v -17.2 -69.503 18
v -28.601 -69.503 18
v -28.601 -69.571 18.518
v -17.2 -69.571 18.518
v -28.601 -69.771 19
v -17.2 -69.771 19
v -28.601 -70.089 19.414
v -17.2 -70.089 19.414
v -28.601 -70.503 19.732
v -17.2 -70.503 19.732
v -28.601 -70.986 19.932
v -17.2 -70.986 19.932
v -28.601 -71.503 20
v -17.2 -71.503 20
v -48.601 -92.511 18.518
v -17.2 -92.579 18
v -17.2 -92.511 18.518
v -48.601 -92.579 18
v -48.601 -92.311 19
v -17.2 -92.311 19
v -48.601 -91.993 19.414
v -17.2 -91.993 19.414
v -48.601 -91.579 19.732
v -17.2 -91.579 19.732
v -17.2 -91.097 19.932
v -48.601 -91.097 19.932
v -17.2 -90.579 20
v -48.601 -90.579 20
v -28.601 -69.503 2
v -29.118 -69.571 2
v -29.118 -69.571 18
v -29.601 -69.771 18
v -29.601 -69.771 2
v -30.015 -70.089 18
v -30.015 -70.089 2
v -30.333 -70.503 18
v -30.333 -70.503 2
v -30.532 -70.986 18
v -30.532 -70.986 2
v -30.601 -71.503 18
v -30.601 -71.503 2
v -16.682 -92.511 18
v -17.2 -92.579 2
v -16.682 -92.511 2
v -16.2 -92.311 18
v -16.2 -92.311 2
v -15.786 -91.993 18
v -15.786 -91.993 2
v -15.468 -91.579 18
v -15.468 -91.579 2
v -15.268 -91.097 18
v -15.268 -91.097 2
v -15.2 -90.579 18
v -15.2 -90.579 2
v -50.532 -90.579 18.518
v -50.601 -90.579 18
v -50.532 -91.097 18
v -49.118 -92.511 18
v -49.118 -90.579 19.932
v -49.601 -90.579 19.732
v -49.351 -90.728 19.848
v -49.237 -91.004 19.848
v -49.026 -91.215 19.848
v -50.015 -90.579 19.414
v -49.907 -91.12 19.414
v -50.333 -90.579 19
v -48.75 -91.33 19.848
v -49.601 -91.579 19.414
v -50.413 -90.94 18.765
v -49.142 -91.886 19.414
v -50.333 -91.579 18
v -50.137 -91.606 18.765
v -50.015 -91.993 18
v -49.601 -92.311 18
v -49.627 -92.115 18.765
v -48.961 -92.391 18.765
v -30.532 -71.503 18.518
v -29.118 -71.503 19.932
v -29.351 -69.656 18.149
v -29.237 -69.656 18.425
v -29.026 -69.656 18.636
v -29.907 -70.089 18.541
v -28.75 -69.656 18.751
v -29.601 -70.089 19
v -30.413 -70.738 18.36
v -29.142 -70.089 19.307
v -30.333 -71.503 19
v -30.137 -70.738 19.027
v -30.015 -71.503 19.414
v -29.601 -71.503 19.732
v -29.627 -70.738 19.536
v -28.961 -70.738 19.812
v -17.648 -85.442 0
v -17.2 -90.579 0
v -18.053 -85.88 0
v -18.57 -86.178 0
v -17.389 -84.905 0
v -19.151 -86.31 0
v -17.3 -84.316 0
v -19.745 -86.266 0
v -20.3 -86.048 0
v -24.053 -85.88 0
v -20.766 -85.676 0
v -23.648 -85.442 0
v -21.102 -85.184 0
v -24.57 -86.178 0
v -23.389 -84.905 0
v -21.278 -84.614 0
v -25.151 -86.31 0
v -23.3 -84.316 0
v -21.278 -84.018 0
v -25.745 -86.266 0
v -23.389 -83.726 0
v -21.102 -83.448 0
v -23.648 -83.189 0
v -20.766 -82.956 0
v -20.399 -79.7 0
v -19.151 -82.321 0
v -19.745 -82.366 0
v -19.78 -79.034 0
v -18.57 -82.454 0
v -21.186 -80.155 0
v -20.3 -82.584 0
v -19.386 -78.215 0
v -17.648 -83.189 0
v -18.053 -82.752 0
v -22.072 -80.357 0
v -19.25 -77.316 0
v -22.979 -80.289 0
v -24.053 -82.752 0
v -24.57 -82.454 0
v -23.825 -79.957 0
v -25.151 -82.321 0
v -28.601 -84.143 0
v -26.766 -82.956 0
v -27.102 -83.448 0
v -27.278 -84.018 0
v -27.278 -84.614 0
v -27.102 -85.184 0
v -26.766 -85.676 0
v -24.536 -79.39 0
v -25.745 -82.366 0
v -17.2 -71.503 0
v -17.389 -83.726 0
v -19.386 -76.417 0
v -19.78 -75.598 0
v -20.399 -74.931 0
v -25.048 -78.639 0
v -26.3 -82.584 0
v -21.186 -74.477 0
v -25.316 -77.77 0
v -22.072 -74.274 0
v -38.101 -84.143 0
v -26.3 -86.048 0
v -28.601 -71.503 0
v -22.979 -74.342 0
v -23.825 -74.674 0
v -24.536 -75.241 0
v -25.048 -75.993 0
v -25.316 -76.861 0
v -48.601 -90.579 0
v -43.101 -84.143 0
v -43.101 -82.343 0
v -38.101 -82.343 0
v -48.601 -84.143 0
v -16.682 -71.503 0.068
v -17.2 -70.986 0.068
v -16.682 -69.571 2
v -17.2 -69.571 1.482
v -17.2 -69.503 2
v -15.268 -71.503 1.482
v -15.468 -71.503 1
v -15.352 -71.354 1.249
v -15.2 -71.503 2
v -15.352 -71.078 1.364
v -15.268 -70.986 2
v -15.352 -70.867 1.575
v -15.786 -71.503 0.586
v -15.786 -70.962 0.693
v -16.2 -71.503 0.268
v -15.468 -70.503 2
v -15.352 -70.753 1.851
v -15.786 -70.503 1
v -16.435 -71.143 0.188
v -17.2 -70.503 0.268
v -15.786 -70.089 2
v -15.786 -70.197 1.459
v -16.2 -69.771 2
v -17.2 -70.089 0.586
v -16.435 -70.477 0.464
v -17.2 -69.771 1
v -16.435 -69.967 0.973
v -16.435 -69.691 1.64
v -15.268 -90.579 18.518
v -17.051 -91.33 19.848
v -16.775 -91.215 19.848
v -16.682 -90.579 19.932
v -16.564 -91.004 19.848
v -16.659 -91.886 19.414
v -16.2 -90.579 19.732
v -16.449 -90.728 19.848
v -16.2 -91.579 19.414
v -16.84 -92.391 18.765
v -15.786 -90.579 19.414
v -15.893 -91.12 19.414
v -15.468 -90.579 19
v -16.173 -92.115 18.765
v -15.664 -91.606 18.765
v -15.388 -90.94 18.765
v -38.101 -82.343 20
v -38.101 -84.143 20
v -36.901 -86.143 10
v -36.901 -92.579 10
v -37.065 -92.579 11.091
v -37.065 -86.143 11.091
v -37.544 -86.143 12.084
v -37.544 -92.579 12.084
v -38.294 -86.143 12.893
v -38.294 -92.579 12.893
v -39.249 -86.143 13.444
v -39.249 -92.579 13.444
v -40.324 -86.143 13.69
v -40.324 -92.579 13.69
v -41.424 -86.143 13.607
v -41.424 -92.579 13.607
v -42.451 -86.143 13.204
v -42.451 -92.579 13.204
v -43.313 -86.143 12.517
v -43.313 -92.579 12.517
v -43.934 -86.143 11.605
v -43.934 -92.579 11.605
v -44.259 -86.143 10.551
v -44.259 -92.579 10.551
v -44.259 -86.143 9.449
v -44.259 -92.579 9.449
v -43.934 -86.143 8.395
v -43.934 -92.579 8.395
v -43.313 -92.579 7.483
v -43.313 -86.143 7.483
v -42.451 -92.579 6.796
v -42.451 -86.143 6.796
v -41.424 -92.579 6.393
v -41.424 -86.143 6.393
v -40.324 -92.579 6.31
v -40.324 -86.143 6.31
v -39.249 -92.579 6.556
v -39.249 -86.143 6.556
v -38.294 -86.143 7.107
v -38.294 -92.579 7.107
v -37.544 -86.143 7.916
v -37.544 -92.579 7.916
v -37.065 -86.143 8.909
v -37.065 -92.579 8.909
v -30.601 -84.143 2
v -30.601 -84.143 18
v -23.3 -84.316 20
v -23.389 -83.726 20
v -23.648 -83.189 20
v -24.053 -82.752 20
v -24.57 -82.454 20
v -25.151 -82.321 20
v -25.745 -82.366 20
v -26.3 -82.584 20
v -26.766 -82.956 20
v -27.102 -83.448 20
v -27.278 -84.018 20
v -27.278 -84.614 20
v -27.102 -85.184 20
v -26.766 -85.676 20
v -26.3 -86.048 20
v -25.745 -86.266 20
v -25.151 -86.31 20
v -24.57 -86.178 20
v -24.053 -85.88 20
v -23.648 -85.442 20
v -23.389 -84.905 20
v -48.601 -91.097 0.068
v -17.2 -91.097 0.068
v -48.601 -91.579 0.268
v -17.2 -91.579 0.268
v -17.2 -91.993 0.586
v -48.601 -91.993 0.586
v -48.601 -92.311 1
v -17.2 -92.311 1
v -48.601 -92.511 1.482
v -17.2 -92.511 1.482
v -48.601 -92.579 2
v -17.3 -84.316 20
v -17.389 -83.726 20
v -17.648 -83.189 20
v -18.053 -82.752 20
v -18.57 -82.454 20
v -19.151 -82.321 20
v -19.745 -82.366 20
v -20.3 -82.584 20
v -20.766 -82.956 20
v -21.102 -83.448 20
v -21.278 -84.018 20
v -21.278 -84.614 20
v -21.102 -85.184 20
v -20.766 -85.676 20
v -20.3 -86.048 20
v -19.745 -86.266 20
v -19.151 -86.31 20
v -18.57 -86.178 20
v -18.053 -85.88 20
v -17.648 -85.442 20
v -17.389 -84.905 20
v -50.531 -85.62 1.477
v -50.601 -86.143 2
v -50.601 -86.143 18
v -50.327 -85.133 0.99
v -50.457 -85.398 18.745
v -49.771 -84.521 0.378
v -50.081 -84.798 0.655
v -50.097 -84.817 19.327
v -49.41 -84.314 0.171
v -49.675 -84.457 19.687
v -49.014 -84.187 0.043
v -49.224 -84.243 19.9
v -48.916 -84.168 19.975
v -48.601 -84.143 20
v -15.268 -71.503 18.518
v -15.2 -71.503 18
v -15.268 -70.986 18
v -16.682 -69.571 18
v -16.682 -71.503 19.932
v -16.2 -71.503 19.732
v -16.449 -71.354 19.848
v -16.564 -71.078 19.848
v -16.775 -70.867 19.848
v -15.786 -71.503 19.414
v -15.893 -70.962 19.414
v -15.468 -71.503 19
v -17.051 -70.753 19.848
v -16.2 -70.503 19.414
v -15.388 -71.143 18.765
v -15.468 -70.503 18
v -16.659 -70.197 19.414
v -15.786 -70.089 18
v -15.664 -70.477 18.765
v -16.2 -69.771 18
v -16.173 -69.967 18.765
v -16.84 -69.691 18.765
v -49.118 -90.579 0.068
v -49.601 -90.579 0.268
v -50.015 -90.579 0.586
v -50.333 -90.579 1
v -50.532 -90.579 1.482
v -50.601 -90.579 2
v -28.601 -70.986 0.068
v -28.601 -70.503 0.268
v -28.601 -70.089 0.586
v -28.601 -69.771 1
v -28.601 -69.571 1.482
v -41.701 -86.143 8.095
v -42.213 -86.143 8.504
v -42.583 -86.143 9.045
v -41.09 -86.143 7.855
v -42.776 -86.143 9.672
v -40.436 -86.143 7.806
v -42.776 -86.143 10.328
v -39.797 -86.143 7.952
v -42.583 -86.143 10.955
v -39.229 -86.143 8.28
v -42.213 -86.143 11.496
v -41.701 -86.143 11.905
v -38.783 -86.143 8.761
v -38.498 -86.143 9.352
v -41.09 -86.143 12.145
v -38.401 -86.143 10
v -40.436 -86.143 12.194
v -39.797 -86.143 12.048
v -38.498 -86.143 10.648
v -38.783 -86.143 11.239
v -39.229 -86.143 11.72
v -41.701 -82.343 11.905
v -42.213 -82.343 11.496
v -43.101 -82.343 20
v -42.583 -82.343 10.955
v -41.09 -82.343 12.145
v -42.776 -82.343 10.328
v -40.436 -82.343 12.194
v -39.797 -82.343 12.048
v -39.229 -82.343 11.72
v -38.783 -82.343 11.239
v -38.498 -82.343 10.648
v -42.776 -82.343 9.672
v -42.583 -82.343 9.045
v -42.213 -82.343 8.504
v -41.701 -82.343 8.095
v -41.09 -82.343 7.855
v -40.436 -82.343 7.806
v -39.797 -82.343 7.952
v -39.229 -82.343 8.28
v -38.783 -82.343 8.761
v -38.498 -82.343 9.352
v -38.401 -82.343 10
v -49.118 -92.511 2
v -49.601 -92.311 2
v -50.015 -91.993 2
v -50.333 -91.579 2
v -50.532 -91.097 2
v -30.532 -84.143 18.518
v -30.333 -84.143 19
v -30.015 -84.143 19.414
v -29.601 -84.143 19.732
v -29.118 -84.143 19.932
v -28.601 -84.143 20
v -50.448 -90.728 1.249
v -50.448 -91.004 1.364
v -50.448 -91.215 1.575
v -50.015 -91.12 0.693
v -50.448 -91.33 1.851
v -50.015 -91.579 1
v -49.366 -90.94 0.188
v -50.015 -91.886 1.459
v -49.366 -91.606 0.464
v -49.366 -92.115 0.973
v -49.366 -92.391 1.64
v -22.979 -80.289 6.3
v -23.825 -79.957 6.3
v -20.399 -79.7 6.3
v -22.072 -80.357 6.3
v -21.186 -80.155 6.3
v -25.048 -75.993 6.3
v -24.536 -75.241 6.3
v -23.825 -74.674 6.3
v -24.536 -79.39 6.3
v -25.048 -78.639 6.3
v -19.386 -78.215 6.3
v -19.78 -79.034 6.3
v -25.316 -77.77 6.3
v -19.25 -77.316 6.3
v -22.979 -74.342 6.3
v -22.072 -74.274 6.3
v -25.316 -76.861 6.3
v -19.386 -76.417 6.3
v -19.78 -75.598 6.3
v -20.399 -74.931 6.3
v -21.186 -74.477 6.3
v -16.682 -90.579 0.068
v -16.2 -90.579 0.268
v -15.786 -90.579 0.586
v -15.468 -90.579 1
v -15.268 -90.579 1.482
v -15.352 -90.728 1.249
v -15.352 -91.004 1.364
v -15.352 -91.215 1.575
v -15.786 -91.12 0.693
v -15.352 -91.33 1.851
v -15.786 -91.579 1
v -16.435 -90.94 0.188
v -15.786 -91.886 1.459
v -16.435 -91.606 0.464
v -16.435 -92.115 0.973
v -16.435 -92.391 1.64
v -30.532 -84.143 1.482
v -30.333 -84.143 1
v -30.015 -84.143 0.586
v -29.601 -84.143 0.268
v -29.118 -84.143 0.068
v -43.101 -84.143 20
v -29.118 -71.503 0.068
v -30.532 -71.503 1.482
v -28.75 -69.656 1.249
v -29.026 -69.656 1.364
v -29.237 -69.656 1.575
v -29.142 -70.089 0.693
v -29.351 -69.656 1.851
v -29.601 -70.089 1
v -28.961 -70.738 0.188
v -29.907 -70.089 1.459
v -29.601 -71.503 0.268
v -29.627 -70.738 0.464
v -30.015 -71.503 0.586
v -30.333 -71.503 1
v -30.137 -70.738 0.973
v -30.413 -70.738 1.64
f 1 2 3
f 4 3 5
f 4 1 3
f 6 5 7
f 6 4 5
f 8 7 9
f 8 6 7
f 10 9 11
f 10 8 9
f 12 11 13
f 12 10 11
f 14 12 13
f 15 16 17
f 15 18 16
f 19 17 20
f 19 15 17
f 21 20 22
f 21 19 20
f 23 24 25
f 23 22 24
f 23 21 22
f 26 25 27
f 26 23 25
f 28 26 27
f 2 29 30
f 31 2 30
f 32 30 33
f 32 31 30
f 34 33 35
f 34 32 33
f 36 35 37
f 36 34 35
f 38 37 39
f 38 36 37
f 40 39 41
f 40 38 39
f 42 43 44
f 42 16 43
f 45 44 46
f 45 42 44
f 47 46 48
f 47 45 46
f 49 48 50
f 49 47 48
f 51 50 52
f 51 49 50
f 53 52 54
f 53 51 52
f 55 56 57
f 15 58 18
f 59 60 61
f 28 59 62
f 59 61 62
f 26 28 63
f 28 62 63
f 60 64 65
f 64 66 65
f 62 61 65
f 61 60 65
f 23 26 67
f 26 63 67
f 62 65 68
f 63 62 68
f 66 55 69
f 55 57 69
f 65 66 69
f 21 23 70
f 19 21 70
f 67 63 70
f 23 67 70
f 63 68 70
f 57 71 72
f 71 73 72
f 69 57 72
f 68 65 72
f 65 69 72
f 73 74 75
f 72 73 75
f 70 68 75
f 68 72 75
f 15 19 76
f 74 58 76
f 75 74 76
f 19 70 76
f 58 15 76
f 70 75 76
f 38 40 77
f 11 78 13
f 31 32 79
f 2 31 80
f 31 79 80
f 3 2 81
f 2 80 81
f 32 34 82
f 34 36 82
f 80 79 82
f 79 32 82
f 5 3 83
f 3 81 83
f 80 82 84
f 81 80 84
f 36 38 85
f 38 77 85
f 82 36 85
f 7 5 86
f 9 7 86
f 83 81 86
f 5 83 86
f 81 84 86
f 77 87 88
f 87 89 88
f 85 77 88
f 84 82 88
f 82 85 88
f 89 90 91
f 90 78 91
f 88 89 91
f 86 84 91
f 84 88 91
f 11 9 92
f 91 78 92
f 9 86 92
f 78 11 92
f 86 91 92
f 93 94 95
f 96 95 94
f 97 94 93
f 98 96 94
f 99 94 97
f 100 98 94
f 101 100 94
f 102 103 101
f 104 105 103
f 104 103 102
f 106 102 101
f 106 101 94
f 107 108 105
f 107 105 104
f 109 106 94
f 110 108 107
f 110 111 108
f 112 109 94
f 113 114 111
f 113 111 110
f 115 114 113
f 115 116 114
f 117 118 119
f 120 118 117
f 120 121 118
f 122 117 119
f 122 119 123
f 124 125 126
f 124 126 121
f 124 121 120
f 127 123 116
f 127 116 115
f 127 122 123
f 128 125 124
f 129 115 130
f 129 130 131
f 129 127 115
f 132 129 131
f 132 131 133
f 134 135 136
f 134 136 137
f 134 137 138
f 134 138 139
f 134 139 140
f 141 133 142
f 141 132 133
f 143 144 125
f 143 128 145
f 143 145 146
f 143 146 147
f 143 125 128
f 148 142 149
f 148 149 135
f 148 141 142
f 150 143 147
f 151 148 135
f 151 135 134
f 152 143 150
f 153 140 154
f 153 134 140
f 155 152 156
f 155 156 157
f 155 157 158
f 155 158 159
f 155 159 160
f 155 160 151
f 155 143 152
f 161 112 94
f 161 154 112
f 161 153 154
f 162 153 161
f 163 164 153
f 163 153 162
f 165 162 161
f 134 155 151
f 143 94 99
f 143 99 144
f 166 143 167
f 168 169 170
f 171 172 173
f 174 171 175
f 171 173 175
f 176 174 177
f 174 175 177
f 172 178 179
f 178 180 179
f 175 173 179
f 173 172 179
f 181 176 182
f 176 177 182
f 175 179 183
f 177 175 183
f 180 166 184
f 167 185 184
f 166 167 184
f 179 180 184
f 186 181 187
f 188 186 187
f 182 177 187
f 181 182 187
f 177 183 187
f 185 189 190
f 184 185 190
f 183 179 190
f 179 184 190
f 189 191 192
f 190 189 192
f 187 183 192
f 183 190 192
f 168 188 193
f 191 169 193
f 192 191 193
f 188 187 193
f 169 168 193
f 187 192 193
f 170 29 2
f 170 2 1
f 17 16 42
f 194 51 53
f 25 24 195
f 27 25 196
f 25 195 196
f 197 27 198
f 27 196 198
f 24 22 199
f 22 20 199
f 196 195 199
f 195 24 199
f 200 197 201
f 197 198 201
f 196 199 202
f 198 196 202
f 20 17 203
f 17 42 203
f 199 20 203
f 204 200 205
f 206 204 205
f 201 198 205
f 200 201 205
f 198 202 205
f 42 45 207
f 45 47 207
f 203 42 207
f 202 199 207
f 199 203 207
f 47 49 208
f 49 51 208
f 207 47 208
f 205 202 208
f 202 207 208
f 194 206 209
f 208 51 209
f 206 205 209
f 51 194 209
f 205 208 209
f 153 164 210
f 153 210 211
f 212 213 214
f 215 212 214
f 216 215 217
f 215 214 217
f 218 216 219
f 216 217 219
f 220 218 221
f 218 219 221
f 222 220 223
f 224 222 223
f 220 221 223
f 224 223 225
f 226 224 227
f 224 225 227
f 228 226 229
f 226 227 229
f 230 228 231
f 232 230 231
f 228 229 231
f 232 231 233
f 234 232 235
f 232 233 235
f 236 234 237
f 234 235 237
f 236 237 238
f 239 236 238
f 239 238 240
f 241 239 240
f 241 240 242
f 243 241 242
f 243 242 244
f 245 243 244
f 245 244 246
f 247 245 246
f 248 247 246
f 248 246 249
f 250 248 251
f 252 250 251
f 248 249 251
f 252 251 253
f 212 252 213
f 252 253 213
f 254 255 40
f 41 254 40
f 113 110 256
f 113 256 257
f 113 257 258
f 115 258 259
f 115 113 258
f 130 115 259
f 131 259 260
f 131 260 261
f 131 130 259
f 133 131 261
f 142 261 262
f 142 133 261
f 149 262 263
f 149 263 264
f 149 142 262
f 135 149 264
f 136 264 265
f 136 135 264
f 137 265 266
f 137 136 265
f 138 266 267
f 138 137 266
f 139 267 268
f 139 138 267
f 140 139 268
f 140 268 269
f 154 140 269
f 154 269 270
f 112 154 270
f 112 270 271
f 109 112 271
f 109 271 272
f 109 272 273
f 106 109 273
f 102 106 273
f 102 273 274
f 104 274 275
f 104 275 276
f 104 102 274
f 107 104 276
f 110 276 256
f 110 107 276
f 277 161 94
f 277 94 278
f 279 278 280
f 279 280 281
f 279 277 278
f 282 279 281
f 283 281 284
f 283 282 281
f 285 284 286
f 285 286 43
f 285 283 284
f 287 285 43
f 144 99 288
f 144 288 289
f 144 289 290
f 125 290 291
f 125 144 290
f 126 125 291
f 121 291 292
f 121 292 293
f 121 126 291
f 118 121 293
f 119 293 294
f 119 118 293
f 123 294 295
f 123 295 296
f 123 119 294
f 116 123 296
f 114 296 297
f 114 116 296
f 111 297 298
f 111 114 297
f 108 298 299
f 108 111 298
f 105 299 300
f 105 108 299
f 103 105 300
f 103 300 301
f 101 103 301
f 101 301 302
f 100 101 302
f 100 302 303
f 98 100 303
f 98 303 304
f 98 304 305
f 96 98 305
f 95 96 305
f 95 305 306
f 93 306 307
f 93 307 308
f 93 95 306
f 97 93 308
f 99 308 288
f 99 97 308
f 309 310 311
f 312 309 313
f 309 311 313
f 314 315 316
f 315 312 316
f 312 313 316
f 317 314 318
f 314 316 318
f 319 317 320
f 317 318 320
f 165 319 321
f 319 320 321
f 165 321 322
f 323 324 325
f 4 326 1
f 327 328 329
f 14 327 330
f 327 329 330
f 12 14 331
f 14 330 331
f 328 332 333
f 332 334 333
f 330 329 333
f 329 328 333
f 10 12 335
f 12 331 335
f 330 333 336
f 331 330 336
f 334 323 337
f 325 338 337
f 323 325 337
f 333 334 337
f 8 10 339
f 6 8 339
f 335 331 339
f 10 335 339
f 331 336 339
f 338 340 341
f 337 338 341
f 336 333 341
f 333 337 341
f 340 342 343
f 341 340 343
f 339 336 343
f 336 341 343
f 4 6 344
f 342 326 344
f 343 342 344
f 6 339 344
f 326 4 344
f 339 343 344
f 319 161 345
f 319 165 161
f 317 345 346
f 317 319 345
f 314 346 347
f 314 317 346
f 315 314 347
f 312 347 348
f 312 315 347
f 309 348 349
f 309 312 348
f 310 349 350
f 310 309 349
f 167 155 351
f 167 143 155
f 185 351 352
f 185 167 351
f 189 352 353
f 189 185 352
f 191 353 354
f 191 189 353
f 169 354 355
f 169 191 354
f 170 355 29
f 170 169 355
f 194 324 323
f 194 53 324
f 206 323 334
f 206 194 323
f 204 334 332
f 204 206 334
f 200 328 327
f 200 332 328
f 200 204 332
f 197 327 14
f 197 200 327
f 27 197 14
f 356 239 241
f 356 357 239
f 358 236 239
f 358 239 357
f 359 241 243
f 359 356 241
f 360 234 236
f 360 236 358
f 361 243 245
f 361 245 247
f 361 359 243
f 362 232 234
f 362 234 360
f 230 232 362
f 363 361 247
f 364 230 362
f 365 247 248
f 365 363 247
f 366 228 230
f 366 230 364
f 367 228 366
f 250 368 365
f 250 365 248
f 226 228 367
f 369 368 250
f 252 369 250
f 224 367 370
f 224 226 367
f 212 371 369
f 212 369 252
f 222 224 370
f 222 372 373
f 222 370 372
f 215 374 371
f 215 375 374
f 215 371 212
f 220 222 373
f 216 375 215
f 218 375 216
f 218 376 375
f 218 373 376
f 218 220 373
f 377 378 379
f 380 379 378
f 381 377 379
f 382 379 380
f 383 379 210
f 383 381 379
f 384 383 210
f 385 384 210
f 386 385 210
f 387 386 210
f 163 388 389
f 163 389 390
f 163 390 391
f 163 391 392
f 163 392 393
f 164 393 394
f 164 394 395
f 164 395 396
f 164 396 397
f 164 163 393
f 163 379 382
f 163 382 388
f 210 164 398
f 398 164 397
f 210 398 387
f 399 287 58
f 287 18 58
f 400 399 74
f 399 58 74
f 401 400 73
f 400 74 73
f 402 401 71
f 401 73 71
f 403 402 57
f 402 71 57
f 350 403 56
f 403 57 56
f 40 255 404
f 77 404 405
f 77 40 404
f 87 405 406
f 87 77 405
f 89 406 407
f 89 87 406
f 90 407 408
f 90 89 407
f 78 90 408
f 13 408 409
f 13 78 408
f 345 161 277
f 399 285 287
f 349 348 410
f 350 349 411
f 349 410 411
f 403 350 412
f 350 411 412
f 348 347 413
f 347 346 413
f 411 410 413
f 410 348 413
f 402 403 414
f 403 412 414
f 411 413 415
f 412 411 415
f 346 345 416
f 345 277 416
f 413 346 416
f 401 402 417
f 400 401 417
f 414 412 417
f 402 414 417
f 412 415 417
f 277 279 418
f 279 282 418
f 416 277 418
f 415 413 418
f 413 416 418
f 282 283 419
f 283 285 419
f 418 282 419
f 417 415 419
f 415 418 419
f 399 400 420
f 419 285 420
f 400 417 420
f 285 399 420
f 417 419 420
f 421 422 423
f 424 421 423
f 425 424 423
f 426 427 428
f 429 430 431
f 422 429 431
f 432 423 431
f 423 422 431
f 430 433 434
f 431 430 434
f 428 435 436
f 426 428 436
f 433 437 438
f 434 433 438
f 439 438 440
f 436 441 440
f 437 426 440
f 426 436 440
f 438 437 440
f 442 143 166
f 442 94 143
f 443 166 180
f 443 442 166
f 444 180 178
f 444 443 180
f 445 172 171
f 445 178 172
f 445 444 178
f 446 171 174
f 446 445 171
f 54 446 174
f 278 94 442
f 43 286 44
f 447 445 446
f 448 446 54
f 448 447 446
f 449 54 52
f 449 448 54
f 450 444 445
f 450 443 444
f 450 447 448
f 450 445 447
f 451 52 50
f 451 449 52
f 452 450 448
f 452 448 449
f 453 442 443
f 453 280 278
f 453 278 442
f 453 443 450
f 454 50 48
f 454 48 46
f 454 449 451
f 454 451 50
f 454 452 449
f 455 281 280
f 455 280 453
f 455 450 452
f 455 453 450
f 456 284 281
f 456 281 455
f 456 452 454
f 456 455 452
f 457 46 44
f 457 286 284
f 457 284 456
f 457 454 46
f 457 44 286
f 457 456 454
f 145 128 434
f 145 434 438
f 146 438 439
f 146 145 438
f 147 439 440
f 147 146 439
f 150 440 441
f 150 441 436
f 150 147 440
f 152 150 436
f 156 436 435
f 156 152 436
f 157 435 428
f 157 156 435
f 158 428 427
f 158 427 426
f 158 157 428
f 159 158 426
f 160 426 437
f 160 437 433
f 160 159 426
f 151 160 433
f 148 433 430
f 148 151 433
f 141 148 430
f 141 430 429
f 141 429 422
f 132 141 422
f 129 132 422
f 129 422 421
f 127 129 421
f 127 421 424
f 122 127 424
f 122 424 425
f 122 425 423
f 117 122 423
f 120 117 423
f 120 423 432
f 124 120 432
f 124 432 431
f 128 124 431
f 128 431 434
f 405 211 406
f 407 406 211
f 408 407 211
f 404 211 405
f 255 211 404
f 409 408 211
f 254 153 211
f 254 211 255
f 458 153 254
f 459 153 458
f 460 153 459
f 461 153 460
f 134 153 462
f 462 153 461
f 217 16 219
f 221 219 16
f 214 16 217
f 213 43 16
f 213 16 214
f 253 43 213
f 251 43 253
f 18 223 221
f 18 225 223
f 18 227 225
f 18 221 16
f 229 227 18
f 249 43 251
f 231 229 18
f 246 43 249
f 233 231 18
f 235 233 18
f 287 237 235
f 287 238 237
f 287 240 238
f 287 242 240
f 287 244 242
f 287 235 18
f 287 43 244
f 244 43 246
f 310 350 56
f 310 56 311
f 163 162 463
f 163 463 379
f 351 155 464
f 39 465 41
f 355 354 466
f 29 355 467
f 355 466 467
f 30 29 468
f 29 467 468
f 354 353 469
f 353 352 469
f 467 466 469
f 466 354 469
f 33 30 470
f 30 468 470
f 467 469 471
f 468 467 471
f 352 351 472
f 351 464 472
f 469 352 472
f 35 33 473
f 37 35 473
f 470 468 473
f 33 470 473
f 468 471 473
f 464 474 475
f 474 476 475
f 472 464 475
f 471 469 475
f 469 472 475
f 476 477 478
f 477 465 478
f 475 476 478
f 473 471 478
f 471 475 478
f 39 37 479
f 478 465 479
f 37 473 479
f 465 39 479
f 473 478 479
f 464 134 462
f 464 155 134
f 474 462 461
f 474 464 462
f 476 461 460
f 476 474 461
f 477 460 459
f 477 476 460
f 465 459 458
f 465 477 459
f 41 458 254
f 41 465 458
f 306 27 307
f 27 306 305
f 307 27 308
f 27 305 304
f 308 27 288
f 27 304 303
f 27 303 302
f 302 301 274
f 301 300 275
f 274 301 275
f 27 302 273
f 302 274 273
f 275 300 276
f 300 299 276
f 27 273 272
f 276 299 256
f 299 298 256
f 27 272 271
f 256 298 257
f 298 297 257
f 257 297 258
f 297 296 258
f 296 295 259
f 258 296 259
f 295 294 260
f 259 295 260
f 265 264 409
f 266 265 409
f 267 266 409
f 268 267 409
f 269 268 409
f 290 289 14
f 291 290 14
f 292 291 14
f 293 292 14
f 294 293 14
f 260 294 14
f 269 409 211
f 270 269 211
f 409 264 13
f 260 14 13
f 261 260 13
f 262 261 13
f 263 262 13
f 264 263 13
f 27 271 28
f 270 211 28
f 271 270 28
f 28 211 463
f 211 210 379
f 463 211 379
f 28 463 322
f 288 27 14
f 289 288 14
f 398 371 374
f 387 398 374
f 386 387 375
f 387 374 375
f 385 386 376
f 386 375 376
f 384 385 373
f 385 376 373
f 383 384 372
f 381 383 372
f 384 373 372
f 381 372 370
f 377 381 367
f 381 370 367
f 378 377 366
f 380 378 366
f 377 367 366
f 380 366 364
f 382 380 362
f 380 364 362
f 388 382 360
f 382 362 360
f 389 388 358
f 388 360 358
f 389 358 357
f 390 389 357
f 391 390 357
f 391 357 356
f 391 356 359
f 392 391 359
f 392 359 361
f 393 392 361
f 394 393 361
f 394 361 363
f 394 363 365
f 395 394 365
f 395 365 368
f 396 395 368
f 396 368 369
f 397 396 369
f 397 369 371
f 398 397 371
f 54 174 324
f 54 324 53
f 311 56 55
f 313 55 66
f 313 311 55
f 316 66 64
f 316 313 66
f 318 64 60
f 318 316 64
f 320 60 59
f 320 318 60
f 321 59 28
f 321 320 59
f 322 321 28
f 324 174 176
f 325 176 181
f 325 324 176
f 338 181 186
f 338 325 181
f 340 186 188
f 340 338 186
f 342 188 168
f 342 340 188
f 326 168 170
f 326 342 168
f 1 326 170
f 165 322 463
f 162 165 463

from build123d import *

# Parameters (mm, degrees)
SKETCH1_R           = 2
SKETCH1_R_2         = 3.05
BOSS_EXTRUDE1_DEPTH = 20
SKETCH2_R           = 2.2
CUT_EXTRUDE1_DEPTH  = 27.508
SKETCH2_3_R         = 3.7
SKETCH2_3_R_2       = 2.2
CUT_EXTRUDE2_DEPTH  = 6.435712
BOSS_EXTRUDE2_START = 6.3
SKETCH1_2_R         = 3.05
BOSS_EXTRUDE2_DEPTH = 13.7
FILLET1_R           = 2


with BuildPart() as part:
    # Sketch1 → Boss-Extrude1 (new body)
    with BuildSketch(Plane.XY):
        Polygon((-15.2, -92.57905153), (-50.600589502, -92.57905153), (-50.600589502, -84.143339933), (-43.100589502, -84.143339933), (-43.100589502, -82.343339933), (-38.100589502, -82.343339933), (-38.100589502, -84.143339933), (-30.600589502, -84.143339933), (-30.600589502, -69.503339933), (-15.2, -69.503339933), align=None)
        with Locations((-25.300294751, -84.31585339)):
            Circle(SKETCH1_R, mode=Mode.SUBTRACT)
        with Locations((-19.300294751, -84.31585339)):
            Circle(SKETCH1_R, mode=Mode.SUBTRACT)
        with Locations((-22.300294751, -77.31585339)):
            Circle(SKETCH1_R_2, mode=Mode.SUBTRACT)
    extrude(amount=BOSS_EXTRUDE1_DEPTH)

    # Sketch2 → Cut-Extrude1 (cut)
    with BuildSketch(Plane.XZ.offset(92.57905153)):
        with Locations((-40.600589502, 10)):
            Circle(SKETCH2_R)
    extrude(amount=-CUT_EXTRUDE1_DEPTH, mode=Mode.SUBTRACT)

    # Sketch2<3> → Cut-Extrude2 (cut)
    with BuildSketch(Plane.XZ.offset(92.57905153)):
        with Locations((-40.600589502, 10)):
            Circle(SKETCH2_3_R)
        with Locations((-40.600589502, 10)):
            Circle(SKETCH2_3_R_2, mode=Mode.SUBTRACT)
    extrude(amount=-CUT_EXTRUDE2_DEPTH, mode=Mode.SUBTRACT)

    # Sketch1<2> → Boss-Extrude2 (add)
    with BuildSketch(Plane.XY.offset(BOSS_EXTRUDE2_START)):
        with Locations((-22.300294751, -77.31585339)):
            Circle(SKETCH1_2_R)
    extrude(amount=BOSS_EXTRUDE2_DEPTH)

    # Fillet1
    fillet1_edges = [part.edges().sort_by_distance(p)[0] for p in [
        (-32.900294751, -92.57905153, 0),
        (-50.600589502, -88.361195731, 0),
        (-30.600589502, -76.823339933, 20),
        (-30.600589502, -76.823339933, 0),
        (-22.900294751, -69.503339933, 0),
        (-15.2, -81.041195731, 0),
        (-15.2, -92.57905153, 10),
        (-50.600589502, -92.57905153, 10),
        (-50.600589502, -84.143339933, 10),
        (-30.600589502, -69.503339933, 10),
        (-15.2, -69.503339933, 10),
        (-50.600589502, -88.361195731, 20),
        (-32.900294751, -92.57905153, 20),
        (-15.2, -81.041195731, 20),
        (-22.900294751, -69.503339933, 20),
    ]]
    fillet(fillet1_edges, radius=FILLET1_R)


solid = part.part
